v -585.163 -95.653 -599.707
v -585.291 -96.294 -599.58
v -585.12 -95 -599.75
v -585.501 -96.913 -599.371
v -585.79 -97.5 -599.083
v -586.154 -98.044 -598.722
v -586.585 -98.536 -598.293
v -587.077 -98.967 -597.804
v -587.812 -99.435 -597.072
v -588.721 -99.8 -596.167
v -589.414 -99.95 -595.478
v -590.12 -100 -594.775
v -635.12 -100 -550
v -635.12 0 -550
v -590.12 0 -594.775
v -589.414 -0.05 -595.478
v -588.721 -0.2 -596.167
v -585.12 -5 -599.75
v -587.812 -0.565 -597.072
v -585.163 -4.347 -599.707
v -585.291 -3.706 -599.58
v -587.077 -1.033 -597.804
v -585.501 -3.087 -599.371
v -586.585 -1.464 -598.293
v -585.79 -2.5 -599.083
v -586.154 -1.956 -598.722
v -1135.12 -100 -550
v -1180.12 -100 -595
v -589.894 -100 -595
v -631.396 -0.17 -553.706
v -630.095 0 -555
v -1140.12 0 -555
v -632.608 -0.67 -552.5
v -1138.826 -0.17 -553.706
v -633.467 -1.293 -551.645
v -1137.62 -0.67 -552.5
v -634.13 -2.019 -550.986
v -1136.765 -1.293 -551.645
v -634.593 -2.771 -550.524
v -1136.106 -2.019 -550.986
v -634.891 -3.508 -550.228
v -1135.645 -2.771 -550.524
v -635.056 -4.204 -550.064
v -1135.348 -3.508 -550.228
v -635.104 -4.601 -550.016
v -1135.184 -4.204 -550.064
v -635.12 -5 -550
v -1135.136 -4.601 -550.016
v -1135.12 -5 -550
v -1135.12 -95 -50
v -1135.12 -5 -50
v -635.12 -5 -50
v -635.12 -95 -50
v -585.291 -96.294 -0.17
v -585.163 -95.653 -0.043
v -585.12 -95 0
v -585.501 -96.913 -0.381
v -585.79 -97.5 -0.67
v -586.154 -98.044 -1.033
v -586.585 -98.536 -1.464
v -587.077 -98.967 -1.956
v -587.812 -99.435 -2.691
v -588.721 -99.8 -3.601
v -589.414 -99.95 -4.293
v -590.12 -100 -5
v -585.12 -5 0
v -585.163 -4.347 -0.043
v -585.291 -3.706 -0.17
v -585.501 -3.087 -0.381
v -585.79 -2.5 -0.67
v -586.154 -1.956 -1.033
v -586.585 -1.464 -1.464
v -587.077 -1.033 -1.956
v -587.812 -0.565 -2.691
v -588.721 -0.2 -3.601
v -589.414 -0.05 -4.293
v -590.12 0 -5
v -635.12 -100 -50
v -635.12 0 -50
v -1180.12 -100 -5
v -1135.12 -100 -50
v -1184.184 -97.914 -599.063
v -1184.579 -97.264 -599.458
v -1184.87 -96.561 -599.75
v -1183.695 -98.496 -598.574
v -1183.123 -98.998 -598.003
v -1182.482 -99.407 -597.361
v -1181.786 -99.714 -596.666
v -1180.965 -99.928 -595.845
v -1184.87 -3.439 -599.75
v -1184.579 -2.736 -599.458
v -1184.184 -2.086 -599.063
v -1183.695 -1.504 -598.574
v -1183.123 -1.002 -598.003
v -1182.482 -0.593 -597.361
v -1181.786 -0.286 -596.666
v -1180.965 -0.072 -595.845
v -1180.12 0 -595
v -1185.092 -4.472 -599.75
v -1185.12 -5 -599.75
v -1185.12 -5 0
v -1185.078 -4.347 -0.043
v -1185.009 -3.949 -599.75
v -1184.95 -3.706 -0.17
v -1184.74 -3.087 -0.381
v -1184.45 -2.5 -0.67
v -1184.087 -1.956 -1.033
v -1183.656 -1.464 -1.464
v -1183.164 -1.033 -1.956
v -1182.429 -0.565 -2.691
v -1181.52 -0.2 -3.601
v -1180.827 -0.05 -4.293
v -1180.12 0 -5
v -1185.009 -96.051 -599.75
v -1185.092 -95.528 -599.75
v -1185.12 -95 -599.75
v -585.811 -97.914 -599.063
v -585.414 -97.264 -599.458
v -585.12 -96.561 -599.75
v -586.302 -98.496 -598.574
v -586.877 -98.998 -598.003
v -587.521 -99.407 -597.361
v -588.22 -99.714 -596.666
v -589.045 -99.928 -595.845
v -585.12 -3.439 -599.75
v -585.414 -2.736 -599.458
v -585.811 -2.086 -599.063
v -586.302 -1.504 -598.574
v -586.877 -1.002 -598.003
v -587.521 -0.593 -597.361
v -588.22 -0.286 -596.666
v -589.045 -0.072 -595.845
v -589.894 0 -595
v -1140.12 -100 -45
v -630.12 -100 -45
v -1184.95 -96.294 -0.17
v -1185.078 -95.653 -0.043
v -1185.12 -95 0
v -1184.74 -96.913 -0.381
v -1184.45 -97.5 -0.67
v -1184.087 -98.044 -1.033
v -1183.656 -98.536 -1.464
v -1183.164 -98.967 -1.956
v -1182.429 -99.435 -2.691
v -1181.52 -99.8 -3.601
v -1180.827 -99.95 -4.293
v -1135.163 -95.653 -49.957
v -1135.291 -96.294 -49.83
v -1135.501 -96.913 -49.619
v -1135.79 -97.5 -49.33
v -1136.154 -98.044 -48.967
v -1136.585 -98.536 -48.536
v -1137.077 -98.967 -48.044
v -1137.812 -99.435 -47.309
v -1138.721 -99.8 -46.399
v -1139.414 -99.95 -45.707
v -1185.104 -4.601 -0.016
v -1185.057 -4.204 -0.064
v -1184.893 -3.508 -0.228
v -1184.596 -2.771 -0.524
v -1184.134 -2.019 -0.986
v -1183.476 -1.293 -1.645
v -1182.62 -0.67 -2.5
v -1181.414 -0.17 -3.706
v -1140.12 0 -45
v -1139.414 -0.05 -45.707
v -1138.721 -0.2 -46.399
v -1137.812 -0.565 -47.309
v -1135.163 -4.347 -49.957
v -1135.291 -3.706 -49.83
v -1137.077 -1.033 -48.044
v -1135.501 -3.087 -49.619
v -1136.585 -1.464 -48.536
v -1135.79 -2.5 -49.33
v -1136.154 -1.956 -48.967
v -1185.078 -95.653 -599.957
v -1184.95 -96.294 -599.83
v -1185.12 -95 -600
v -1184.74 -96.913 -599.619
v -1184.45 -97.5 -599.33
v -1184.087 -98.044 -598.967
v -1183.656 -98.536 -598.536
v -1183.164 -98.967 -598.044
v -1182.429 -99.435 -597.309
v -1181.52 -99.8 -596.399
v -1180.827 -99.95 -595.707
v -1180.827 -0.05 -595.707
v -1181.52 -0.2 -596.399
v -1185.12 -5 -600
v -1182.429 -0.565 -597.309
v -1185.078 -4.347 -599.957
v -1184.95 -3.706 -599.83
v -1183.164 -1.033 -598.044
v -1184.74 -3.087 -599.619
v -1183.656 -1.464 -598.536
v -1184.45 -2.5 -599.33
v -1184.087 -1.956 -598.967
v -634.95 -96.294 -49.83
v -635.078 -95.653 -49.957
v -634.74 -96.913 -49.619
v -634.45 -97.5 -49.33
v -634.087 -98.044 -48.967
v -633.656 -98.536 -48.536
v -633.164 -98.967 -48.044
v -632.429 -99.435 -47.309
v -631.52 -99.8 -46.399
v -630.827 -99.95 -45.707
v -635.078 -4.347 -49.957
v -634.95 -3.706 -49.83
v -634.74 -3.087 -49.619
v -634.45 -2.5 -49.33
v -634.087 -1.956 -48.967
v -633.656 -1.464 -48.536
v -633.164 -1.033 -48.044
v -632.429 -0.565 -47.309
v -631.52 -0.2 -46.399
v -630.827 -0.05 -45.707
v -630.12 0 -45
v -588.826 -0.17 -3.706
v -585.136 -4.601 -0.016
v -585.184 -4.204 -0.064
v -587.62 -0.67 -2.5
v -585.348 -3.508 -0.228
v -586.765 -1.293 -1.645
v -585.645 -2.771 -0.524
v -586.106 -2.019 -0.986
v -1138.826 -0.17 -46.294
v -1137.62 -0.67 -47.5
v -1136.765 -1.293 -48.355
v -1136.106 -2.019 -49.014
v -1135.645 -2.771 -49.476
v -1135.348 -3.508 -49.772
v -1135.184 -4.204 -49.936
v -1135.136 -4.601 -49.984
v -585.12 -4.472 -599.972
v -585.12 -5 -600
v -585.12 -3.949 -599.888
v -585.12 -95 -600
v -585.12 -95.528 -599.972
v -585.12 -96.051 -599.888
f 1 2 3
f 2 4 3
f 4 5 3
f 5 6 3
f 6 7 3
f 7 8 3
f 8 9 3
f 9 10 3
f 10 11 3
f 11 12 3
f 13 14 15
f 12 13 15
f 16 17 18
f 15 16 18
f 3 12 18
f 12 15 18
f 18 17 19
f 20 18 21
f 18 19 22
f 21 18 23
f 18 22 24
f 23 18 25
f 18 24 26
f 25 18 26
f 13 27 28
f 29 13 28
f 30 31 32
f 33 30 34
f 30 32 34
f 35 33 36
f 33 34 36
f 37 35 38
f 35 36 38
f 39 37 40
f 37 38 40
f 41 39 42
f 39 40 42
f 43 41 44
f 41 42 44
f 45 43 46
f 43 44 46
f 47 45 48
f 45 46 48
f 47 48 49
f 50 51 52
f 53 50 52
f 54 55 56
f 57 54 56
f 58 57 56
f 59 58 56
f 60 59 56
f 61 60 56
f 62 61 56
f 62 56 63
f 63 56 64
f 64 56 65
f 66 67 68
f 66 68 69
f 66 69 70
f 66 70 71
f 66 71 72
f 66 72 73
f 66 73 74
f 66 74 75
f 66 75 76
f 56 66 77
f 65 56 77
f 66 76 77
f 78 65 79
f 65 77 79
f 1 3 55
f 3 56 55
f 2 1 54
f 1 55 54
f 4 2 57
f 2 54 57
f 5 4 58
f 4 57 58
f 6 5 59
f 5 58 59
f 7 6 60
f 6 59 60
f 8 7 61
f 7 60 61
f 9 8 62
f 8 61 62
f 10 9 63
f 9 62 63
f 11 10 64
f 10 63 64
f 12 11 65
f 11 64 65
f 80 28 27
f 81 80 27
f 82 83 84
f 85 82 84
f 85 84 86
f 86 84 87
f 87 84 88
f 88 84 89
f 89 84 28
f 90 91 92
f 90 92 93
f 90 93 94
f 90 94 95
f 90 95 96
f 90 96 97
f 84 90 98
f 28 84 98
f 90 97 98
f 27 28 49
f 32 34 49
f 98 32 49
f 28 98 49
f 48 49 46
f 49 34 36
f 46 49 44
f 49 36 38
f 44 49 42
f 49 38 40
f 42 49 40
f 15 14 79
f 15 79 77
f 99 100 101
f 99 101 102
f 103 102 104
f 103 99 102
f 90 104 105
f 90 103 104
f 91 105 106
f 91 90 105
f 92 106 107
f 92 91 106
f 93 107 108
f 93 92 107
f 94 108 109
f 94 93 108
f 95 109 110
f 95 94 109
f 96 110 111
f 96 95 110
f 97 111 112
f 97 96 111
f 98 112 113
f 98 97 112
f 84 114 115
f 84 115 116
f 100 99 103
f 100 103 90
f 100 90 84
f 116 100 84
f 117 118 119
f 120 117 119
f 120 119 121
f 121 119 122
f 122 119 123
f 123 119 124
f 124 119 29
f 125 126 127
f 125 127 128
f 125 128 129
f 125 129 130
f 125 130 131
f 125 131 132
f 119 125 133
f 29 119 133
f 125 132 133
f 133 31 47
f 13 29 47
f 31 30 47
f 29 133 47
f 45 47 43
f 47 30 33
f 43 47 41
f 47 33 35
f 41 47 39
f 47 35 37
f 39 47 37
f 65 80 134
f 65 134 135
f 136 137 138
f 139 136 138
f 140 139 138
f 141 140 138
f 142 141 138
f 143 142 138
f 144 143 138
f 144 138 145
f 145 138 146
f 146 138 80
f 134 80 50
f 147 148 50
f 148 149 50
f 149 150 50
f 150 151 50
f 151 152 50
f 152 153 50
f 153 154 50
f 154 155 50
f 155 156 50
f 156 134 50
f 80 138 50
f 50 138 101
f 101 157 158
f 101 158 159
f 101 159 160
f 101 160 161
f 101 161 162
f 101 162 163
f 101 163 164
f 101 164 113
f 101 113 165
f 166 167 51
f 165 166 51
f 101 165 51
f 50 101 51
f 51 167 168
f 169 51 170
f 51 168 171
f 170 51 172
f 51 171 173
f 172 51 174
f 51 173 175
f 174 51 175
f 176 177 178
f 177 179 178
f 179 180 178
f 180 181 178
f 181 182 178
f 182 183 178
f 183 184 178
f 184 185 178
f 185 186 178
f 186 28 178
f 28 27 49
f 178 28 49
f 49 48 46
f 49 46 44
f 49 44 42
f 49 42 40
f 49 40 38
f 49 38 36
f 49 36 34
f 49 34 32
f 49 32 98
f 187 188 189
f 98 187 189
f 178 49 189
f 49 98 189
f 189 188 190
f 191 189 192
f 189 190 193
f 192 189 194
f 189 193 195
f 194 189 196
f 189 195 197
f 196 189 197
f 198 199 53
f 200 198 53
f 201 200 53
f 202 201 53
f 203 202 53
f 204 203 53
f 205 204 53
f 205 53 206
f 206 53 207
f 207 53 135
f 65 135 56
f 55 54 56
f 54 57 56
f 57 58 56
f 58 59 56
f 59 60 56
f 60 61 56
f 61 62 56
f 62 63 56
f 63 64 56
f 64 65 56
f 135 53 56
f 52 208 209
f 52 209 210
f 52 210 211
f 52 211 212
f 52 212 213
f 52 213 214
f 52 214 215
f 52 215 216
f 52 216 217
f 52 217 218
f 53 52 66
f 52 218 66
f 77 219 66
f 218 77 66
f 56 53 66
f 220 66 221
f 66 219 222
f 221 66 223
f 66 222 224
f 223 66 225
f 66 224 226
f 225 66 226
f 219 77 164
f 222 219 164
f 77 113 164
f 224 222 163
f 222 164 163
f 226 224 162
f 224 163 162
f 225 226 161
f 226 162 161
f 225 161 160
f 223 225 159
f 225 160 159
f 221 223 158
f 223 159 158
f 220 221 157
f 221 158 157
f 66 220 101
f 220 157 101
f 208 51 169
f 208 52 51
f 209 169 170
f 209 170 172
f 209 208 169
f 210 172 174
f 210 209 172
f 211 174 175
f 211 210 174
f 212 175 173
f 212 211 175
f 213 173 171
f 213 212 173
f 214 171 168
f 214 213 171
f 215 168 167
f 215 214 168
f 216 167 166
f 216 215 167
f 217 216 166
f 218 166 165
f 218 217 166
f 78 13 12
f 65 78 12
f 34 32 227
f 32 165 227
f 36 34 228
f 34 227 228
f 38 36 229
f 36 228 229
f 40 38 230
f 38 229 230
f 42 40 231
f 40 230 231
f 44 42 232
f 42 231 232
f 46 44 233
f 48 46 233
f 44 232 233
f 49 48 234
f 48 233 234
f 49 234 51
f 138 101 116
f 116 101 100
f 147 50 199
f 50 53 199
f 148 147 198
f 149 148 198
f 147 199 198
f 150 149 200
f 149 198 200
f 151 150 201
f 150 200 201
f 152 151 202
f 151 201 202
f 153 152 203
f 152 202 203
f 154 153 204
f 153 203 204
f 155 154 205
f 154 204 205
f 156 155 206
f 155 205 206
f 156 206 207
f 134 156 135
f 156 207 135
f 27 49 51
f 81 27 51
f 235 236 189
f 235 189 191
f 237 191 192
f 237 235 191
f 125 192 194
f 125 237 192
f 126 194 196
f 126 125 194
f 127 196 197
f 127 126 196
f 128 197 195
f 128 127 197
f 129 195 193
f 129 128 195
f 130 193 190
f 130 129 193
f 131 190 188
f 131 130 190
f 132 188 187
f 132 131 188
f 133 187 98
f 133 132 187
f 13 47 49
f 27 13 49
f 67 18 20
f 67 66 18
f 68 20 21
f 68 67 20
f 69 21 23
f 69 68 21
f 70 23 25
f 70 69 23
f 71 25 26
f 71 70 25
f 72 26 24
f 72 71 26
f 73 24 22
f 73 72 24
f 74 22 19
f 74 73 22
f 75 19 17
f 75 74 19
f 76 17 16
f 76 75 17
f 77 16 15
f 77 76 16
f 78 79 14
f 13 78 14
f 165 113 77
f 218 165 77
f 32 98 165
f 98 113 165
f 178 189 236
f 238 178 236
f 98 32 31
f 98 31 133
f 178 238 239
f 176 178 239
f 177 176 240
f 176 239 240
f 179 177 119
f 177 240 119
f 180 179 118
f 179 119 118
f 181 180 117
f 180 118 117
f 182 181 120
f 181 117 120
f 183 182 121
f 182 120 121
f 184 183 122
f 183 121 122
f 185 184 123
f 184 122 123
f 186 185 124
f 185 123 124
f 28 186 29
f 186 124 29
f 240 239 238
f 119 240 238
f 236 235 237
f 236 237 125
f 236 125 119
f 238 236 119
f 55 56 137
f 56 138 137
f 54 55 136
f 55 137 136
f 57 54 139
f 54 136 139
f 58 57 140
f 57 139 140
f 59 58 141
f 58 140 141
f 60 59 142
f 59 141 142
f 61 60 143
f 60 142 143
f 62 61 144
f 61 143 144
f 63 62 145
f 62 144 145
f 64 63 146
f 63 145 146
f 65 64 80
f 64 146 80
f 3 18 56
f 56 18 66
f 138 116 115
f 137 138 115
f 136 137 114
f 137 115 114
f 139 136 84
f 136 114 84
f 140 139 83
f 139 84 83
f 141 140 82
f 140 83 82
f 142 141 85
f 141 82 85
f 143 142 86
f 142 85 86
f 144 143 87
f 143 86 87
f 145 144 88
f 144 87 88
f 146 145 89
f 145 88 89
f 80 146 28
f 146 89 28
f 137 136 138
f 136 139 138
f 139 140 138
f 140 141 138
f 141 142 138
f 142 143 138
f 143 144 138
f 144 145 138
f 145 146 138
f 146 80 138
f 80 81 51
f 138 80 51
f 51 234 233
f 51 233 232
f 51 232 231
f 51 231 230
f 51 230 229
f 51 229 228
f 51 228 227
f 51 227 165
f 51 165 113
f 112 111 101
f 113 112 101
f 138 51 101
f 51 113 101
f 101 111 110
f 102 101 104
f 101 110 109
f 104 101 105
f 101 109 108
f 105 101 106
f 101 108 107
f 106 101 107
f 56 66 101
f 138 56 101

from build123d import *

# Parameters (mm, degrees)
F0_DEPTH = 100
F7_DEPTH = 100
F1_DEPTH = 100
F2_DEPTH = 100
F3_R     = 5
F3_2_R   = 5
F3_3_R   = 5
F4_R     = 5
F8_R     = 5
F5_R     = 5
F5_2_R   = 5
F5_3_R   = 5
F5_4_R   = 5


# Not quite as in the source:
# - a feature names something its author has since deleted; it is built from what else it names


with BuildPart() as f0:
    # F6 (on Front) → F0 (new body)
    with BuildSketch(Plane.XZ):
        Polygon((-635.1203695295, -50), (-585.1203695295, 0), (-1185.1203695295, 0), (-1135.1203695295, -50), align=None)
    extrude(amount=F0_DEPTH)

    # F3
    f3_edges = [f0.edges().sort_by_distance(p)[0] for p in [
        (-885.12037, -100, 0),
        (-885.12037, -100, -50),
    ]]
    fillet(f3_edges, radius=F3_R)

    # F5#2
    f5_2_edges = [f0.edges().sort_by_distance(p)[0] for p in [
        (-885.12037, 0, -50),
        (-885.12037, 0, 0),
    ]]
    fillet(f5_2_edges, radius=F5_2_R)


with BuildPart() as f7:
    # F6 (on Front) → F7 (new body)
    with BuildSketch(Plane.XZ):
        Polygon((-1185.1203695295, 0), (-1185.1203695295, -599.75), (-1184.8703695295, -599.75), (-1135.1203695295, -550), (-1135.1203695295, -50), align=None)
    extrude(amount=F7_DEPTH)

    # F3#2
    f3_2_edges = [f7.edges().sort_by_distance(p)[0] for p in [
        (-1185.12037, -100, -299.875),
    ]]
    fillet(f3_2_edges, radius=F3_2_R)

    # F5#3
    f5_3_edges = [f7.edges().sort_by_distance(p)[0] for p in [
        (-1185.12037, 0, -299.875),
        (-1135.12037, 0, -300),
    ]]
    fillet(f5_3_edges, radius=F5_3_R)


with BuildPart() as f1:
    # F6 (on Front) → F1 (new body)
    with BuildSketch(Plane.XZ):
        Polygon((-1135.1203695295, -600), (-585.1203695295, -600), (-585.1203695295, -599.75), (-635.1203695295, -550), (-1135.1203695295, -550), (-1184.8703695295, -599.75), (-1185.1203695295, -600), align=None)
    extrude(amount=F1_DEPTH)

    # F4
    f4_edges = [f1.edges().sort_by_distance(p)[0] for p in [
        (-885.12037, -100, -600),
    ]]
    fillet(f4_edges, radius=F4_R)

    # F8
    f8_edges = [f1.edges().sort_by_distance(p)[0] for p in [
        (-885.12037, 0, -600),
    ]]
    fillet(f8_edges, radius=F8_R)

    # F5#4
    f5_4_edges = [f1.edges().sort_by_distance(p)[0] for p in [
        (-885.12037, 0, -550),
    ]]
    fillet(f5_4_edges, radius=F5_4_R)


with BuildPart() as f2:
    # F6 (on Front) → F2 (new body)
    with BuildSketch(Plane.XZ):
        Polygon((-635.1203695295, -550), (-585.1203695295, -599.75), (-585.1203695295, 0), (-635.1203695295, -50), align=None)
    extrude(amount=F2_DEPTH)

    # F3#3
    f3_3_edges = [f2.edges().sort_by_distance(p)[0] for p in [
        (-585.12037, -100, -299.875),
    ]]
    fillet(f3_3_edges, radius=F3_3_R)

    # F5
    f5_edges = [f2.edges().sort_by_distance(p)[0] for p in [
        (-585.12037, 0, -299.875),
    ]]
    fillet(f5_edges, radius=F5_R)


solid = Compound([f0.part, f7.part, f1.part, f2.part])
